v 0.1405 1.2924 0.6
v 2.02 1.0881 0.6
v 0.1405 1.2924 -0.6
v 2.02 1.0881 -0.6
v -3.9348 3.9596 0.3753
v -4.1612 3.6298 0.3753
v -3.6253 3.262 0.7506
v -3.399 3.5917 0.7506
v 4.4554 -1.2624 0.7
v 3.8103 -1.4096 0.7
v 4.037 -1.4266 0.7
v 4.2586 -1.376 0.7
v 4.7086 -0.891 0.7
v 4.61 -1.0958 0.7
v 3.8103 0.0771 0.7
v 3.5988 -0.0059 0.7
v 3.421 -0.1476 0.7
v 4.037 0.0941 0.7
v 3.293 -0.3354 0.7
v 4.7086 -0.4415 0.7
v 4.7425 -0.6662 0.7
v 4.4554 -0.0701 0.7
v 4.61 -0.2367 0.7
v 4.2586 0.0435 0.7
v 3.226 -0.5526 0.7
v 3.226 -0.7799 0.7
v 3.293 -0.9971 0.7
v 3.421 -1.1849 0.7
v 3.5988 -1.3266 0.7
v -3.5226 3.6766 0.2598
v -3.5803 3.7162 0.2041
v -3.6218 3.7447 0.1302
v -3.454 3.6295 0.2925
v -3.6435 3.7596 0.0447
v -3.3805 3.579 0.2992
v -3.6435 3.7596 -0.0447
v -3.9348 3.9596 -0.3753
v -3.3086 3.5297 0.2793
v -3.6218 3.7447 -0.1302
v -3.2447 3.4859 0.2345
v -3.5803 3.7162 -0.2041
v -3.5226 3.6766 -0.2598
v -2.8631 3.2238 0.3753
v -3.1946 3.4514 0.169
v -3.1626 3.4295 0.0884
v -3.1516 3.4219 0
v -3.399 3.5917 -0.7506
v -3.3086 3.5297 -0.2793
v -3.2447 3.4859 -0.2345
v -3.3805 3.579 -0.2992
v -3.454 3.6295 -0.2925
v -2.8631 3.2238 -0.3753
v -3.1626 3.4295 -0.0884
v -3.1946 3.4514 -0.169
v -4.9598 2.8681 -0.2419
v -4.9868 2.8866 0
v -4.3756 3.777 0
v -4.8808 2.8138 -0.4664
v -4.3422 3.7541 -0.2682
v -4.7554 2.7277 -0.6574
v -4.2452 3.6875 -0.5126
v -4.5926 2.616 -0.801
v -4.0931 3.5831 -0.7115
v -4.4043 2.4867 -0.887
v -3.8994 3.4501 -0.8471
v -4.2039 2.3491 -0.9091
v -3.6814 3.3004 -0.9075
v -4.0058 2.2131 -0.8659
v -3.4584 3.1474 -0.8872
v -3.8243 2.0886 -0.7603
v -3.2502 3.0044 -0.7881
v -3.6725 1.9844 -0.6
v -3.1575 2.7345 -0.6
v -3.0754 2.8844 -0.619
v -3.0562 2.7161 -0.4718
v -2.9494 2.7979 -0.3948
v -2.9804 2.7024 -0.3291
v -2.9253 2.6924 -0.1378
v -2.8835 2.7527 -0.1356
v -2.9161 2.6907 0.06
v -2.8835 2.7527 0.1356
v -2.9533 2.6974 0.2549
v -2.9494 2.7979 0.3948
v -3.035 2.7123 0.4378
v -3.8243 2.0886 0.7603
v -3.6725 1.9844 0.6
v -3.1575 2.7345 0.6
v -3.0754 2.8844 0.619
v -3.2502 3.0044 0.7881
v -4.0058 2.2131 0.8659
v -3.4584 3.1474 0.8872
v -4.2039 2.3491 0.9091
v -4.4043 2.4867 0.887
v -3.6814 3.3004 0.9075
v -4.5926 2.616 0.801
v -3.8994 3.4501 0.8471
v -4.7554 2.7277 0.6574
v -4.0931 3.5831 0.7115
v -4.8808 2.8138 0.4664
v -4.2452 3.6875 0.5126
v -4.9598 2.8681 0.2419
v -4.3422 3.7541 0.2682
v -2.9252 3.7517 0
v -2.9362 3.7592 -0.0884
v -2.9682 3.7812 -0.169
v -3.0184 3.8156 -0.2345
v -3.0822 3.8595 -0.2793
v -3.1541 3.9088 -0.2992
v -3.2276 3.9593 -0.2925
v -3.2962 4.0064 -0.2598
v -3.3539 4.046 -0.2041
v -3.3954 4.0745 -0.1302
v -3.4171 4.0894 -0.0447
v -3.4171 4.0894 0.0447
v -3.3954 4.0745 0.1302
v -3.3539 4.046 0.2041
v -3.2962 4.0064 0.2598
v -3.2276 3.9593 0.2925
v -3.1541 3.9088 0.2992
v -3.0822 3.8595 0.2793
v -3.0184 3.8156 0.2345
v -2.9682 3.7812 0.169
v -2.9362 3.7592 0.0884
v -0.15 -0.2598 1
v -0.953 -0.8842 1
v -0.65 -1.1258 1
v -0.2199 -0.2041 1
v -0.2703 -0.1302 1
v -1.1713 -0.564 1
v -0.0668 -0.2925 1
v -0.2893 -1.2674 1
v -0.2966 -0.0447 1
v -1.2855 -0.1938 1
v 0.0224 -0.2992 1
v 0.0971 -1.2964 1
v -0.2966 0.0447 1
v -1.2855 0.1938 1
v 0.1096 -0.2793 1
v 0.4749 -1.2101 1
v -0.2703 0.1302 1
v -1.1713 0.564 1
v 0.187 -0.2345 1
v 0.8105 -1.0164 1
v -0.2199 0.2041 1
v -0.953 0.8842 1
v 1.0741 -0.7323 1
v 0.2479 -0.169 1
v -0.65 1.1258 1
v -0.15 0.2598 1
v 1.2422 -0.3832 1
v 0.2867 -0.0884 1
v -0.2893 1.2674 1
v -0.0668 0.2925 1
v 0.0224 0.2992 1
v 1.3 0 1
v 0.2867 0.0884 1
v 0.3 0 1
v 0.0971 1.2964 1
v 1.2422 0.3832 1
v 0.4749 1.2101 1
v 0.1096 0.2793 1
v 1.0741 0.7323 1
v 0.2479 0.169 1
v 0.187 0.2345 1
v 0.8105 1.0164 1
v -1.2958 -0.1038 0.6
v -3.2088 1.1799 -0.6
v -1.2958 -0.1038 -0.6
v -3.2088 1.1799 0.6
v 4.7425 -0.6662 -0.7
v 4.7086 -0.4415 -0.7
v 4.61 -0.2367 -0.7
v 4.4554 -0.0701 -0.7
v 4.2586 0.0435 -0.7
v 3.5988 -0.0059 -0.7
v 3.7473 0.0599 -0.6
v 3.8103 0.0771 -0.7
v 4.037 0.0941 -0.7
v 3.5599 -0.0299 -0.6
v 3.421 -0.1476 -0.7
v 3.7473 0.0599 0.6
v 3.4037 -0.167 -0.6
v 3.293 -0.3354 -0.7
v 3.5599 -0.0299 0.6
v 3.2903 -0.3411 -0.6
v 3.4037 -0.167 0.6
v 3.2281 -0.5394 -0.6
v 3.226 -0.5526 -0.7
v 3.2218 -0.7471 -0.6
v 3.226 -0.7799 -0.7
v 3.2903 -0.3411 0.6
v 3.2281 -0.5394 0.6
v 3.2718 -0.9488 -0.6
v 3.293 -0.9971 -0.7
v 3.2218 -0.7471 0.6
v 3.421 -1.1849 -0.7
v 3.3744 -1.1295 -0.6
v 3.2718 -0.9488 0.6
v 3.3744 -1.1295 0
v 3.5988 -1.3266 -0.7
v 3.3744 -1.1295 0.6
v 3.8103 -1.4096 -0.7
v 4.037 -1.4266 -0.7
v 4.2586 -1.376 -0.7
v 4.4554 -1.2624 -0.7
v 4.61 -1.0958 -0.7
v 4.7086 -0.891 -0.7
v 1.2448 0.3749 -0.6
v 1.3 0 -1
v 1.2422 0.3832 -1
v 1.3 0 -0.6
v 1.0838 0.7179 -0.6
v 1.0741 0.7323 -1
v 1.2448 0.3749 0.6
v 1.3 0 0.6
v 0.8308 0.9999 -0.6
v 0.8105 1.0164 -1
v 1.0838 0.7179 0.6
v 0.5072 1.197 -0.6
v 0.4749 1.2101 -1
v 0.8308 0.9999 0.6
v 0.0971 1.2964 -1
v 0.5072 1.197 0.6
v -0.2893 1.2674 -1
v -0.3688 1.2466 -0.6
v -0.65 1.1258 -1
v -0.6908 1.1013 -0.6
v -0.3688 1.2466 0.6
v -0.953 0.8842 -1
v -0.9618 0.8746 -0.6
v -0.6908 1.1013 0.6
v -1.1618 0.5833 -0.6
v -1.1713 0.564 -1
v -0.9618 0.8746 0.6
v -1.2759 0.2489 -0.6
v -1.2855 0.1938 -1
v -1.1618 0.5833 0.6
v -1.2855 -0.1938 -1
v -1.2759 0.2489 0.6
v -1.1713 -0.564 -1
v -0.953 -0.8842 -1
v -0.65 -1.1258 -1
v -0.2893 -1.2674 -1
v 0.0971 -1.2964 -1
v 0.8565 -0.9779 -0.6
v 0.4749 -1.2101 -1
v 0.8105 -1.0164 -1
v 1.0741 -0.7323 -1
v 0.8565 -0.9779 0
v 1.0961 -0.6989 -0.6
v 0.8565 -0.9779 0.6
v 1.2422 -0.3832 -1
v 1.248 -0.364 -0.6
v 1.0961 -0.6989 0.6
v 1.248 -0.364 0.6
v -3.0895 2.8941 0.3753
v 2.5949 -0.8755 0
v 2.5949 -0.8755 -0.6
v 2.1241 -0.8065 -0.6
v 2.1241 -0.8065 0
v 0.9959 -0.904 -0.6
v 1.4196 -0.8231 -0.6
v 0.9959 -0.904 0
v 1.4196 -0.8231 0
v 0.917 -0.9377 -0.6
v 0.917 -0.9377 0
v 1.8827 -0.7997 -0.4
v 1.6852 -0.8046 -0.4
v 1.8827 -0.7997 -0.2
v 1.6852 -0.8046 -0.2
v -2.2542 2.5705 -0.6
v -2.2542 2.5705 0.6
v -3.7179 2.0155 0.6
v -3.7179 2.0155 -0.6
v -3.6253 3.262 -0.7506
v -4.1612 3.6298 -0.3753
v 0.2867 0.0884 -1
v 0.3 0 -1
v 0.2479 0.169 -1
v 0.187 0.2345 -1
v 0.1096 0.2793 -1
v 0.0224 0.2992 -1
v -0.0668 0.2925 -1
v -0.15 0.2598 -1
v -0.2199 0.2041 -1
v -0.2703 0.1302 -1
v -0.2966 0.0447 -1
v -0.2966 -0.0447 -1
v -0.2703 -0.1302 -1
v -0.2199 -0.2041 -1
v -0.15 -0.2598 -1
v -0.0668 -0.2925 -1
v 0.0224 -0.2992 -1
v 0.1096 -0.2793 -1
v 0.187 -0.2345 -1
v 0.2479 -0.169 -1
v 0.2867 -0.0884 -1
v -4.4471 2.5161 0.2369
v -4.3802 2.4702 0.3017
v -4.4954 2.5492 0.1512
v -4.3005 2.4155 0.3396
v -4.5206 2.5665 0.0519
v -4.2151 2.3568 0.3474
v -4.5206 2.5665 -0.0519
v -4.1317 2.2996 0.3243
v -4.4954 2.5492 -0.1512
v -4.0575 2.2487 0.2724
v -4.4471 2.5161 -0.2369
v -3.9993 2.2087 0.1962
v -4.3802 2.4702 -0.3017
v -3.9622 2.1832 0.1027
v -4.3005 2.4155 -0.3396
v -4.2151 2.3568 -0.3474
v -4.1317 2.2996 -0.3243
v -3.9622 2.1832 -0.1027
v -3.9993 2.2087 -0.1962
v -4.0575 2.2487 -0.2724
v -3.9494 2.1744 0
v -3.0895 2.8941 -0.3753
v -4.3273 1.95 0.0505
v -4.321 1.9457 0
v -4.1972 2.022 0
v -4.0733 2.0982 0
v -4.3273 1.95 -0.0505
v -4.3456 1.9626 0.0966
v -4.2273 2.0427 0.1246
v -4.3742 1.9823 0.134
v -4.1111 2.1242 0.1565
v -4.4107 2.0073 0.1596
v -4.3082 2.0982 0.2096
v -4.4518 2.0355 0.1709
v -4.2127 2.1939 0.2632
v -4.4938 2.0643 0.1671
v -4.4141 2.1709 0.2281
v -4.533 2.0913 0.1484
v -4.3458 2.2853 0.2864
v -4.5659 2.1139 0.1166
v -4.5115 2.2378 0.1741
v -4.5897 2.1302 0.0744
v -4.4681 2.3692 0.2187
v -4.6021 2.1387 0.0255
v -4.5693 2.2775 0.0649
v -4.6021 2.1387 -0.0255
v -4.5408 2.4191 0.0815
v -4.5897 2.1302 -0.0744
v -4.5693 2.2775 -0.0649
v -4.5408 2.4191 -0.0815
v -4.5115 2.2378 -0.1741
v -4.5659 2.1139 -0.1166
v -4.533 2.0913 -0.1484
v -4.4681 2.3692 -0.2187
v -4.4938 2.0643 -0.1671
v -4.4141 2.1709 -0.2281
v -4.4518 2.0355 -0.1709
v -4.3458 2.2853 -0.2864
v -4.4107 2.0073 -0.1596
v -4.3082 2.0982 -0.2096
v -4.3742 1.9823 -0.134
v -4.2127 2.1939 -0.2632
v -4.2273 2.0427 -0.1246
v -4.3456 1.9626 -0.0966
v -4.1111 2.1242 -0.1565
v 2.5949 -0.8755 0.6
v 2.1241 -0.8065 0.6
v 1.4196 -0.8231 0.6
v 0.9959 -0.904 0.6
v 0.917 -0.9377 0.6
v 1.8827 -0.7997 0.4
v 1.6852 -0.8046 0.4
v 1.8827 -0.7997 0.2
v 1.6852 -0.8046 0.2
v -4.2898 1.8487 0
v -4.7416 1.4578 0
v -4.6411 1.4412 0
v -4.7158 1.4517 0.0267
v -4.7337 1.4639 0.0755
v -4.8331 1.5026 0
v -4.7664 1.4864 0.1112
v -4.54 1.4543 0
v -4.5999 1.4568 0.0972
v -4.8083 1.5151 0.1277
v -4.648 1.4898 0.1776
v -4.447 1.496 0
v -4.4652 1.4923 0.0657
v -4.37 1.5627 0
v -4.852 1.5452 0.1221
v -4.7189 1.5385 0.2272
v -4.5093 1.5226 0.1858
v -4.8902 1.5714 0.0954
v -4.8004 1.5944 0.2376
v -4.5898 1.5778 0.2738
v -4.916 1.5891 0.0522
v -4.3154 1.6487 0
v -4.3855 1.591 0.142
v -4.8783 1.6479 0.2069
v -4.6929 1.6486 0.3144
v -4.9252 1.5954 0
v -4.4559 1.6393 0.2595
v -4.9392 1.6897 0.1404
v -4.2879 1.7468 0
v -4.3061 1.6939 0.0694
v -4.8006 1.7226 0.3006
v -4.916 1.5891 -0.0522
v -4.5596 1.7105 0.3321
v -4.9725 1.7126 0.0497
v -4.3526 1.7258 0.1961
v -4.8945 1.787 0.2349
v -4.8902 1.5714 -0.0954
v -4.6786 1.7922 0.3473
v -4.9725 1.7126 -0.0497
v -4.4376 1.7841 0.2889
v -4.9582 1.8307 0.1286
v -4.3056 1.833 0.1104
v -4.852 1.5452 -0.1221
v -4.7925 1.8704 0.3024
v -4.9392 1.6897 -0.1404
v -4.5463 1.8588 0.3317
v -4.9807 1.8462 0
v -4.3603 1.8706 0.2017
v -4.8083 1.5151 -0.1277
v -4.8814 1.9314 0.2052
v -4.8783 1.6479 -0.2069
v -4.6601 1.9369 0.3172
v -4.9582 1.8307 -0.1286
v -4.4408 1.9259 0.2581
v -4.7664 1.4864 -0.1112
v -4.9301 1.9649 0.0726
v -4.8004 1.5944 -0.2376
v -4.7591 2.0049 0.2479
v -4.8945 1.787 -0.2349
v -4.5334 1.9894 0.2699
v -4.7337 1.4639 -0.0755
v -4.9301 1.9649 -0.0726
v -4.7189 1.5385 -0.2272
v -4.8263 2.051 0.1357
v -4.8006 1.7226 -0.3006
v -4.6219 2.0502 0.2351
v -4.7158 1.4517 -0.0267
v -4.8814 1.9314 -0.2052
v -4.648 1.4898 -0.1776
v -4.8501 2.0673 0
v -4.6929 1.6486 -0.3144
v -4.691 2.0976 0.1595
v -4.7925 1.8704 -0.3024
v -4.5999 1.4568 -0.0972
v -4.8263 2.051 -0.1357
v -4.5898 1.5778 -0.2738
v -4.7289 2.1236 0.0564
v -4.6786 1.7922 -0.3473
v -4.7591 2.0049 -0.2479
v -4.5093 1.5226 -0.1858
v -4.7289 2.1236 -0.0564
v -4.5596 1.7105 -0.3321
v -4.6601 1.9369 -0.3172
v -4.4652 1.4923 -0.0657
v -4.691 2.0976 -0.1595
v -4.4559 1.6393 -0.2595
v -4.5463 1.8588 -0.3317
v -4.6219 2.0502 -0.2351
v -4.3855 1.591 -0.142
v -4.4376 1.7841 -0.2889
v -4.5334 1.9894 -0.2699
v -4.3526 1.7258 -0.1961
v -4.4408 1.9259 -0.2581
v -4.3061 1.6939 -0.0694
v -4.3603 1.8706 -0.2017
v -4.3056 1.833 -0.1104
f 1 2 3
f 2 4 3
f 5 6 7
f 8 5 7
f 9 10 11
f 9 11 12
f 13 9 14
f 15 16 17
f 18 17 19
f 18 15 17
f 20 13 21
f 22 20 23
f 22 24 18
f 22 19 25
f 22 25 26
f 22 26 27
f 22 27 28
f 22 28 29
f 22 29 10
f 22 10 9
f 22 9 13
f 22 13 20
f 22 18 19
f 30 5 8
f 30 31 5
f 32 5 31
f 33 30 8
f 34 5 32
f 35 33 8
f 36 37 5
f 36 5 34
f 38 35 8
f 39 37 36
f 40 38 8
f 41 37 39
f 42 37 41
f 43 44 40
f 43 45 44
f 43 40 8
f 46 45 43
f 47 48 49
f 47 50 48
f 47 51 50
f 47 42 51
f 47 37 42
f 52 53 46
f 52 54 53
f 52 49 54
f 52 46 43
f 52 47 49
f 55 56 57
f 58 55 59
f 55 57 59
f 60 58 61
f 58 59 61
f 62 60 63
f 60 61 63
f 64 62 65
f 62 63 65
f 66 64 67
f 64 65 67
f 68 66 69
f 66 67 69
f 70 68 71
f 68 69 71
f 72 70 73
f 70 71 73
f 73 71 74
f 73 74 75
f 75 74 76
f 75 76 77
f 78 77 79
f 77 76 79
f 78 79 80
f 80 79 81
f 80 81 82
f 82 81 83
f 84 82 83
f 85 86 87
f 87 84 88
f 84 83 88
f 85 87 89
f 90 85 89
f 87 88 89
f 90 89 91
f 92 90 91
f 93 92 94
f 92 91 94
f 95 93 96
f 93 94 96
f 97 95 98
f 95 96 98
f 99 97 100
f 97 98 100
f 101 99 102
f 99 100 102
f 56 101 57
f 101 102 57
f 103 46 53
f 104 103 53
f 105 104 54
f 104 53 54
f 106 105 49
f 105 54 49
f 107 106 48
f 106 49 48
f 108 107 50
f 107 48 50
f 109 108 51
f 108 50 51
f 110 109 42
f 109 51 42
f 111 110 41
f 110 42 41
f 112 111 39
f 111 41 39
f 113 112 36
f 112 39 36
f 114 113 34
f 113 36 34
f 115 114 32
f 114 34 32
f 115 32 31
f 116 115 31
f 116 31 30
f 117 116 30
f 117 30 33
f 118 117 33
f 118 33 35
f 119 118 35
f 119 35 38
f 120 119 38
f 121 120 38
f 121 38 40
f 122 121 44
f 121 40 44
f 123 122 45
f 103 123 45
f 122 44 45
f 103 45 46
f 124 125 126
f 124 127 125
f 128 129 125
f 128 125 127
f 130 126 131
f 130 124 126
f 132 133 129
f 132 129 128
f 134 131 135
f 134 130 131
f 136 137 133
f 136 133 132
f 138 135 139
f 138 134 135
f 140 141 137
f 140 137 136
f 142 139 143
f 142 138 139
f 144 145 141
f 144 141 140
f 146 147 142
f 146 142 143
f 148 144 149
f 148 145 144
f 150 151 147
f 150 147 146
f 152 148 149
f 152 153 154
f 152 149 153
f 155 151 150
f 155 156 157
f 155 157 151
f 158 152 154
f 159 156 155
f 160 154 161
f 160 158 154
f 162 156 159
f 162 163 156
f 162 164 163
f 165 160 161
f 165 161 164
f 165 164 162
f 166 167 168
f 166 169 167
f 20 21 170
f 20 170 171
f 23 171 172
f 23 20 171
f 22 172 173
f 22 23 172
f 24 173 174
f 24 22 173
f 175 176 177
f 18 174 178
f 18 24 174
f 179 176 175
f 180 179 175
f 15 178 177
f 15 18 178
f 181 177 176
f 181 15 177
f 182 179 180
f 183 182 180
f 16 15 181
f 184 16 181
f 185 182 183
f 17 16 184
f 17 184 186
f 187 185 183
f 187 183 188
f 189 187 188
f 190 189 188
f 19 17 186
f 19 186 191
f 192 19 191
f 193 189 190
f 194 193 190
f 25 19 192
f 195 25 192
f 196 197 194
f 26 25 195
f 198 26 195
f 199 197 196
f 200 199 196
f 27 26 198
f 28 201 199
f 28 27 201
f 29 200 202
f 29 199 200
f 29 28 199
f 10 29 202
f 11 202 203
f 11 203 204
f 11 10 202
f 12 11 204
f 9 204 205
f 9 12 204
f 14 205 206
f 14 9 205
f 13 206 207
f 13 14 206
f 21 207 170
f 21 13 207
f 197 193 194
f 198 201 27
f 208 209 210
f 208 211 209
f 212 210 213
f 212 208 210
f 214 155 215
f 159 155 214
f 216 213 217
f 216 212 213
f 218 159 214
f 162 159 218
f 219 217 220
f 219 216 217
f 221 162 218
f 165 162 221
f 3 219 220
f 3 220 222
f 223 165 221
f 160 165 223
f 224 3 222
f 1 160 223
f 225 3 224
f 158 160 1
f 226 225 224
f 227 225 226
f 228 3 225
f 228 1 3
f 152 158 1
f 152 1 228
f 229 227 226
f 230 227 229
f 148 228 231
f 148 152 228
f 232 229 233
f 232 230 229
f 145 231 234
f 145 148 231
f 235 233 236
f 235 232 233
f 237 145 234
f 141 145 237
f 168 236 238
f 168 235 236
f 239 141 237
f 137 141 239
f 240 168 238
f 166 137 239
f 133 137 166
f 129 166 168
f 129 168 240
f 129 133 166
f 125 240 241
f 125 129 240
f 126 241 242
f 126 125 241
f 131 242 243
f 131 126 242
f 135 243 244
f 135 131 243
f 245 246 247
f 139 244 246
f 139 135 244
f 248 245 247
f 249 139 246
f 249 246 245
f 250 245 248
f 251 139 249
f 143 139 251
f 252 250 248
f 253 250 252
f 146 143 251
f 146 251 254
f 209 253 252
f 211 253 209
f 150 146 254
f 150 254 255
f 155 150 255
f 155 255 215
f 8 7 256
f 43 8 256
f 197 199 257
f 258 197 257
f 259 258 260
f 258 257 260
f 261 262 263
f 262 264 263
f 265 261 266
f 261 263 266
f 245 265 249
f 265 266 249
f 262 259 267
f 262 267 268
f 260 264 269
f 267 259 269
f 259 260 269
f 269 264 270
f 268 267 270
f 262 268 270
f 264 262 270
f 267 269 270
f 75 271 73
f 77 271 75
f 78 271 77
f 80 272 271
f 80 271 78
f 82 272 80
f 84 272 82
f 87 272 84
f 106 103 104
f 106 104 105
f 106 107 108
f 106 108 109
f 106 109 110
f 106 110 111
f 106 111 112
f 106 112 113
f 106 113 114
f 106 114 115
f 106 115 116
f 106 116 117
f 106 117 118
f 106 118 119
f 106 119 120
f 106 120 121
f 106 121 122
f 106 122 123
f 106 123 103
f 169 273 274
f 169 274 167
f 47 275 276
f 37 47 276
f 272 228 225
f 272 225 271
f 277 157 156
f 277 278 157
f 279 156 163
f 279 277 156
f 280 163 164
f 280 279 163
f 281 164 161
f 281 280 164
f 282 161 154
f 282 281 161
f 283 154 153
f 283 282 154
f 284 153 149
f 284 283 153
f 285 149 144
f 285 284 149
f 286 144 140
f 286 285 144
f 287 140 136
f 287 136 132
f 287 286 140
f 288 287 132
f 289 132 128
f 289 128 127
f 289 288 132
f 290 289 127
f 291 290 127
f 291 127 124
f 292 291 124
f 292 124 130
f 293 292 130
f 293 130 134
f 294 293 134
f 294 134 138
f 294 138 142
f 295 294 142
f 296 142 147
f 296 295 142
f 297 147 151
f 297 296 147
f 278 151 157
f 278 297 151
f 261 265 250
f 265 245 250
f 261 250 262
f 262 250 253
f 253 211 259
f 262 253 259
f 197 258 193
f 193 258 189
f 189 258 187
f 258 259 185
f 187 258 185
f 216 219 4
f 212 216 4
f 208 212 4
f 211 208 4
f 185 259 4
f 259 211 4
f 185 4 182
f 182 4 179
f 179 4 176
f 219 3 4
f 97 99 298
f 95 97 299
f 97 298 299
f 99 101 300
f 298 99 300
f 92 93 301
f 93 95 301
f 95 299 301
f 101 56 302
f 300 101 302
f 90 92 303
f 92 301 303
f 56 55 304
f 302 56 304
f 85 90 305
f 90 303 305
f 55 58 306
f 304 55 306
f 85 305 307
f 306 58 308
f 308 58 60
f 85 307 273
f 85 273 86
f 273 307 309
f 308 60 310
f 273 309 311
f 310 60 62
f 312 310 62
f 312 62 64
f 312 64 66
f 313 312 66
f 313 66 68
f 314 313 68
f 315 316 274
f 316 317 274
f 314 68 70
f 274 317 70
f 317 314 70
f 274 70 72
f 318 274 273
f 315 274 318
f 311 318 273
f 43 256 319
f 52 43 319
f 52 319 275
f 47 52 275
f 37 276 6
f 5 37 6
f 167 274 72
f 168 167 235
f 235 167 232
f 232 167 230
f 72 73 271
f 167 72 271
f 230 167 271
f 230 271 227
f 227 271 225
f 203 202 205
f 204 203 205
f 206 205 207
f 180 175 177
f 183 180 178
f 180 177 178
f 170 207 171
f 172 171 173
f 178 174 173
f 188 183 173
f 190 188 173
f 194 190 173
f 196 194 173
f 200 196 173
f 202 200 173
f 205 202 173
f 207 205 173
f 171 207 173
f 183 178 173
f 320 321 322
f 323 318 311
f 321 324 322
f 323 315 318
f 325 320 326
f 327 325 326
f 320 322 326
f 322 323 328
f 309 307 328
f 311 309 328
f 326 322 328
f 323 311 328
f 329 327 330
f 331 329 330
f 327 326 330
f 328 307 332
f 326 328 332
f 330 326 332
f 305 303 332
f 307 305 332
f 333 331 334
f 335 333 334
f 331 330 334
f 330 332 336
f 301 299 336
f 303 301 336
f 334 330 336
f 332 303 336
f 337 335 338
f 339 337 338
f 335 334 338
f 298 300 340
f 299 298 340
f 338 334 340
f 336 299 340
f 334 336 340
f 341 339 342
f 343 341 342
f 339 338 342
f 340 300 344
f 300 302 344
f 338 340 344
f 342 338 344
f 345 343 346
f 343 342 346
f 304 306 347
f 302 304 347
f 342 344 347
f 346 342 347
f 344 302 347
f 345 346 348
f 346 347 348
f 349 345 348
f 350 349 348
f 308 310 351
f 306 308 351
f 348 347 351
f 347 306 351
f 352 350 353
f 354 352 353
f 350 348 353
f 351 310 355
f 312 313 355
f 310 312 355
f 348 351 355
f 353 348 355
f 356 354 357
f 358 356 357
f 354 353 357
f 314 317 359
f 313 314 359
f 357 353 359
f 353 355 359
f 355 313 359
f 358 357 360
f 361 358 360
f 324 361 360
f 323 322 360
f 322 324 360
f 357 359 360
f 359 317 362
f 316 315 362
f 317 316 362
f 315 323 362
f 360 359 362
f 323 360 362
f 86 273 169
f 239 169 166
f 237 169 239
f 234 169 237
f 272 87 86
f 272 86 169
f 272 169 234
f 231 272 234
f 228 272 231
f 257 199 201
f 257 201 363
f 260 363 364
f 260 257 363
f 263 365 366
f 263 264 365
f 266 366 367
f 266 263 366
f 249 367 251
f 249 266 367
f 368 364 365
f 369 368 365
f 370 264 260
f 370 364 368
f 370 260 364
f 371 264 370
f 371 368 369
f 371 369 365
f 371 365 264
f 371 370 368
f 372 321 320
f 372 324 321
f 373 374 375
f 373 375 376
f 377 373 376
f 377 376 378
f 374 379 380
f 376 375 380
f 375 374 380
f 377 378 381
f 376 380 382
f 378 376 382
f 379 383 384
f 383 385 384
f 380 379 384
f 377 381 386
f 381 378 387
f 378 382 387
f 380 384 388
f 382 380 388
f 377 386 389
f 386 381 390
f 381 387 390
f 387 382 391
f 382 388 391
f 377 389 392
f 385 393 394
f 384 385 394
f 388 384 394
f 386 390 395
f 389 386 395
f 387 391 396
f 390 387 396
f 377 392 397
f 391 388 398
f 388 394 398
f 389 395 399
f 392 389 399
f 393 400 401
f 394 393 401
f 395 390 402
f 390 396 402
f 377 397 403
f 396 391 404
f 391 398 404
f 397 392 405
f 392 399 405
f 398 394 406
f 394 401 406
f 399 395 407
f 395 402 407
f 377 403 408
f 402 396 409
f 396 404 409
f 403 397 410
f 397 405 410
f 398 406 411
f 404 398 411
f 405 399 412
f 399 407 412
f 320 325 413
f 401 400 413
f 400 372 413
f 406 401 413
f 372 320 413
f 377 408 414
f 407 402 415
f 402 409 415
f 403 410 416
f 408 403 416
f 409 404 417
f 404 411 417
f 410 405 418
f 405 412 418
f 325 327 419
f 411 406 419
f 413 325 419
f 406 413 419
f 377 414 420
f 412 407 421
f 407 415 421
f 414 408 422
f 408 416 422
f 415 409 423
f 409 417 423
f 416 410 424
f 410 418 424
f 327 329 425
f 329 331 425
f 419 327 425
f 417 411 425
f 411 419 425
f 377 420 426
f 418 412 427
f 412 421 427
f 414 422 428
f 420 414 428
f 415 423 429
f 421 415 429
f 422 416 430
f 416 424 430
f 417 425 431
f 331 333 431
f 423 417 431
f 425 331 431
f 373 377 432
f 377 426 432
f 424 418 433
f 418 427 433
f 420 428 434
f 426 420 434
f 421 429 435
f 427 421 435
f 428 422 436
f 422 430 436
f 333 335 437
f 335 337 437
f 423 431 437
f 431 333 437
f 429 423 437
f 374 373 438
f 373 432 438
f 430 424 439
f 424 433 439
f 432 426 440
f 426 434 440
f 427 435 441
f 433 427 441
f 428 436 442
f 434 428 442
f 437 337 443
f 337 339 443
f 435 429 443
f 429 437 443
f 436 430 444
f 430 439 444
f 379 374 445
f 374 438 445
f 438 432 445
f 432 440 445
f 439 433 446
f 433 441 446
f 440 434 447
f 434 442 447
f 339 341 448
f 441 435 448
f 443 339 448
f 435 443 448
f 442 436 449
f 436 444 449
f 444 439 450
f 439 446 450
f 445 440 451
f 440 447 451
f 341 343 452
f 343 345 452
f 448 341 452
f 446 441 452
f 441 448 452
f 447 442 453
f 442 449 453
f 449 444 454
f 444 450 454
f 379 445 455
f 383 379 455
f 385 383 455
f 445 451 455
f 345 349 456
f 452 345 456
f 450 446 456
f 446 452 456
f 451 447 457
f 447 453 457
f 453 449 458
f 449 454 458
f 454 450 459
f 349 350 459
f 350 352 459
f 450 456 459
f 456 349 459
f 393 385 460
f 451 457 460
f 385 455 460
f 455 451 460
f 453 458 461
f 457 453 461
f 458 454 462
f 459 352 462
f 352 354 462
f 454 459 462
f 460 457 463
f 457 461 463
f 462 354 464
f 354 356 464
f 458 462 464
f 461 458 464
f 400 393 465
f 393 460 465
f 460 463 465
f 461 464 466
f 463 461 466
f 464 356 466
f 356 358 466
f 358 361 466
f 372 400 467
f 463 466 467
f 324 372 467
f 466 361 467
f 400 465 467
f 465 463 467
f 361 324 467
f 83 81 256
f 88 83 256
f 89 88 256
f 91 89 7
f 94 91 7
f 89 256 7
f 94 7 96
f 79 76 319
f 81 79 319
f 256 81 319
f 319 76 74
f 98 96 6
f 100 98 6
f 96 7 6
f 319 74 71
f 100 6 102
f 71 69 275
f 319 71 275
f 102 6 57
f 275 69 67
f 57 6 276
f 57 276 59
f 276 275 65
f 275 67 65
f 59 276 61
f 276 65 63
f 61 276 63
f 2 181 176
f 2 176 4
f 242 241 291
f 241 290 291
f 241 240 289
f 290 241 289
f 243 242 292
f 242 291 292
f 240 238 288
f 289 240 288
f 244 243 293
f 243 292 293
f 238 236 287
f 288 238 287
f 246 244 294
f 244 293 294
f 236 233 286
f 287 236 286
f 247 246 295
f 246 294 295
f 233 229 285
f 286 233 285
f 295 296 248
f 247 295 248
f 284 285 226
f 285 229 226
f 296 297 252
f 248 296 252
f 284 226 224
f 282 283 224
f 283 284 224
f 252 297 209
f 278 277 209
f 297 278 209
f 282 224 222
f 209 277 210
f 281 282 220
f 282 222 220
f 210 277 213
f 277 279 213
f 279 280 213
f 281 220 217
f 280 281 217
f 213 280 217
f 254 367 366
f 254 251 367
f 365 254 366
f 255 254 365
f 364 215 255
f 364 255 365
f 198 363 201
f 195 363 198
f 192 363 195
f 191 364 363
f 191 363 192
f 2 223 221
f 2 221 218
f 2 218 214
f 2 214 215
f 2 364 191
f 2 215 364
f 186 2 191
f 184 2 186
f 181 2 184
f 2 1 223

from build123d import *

# Parameters (mm, degrees)
SKETCH1_R           = 0.3
BOSS_EXTRUDE1_DEPTH = 1
BOSS_EXTRUDE2_DEPTH = 0.7
BOSS_EXTRUDE3_DEPTH = 0.6
BOSS_EXTRUDE4_DEPTH = 0.6
BOSS_EXTRUDE5_DEPTH = 0.4
SKETCH5_R           = 0.3
BOSS_EXTRUDE6_DEPTH = 0.4


with BuildPart() as part:
    # Sketch1 → Boss-Extrude1 (new, symmetric)
    with BuildSketch(Plane.XY):
        with BuildLine():
            ThreePointArc((1.3, 0), (0.967631362, 0.868152951), (0.140477621, 1.292387727))
            ThreePointArc((0.140477621, 1.292387727), (-0.11642585, 1.294776051), (-0.368782161, 1.24659525))
            ThreePointArc((-0.368782161, 1.24659525), (-1.071749439, 0.735767042), (-1.295848634, -0.103809043))
            ThreePointArc((-1.295848634, -0.103809043), (-0.48915419, -1.204461779), (0.856533864, -0.977931357))
            ThreePointArc((0.856533864, -0.977931357), (1.183953974, -0.536891971), (1.3, 0))
        make_face()
        Circle(SKETCH1_R, mode=Mode.SUBTRACT)
    extrude(amount=BOSS_EXTRUDE1_DEPTH, both=True)



with BuildPart() as body_2:
    # Sketch1<3> → Boss-Extrude2 (new, symmetric)
    with BuildSketch(Plane.XY):
        with BuildLine():
            ThreePointArc((4.7425, -0.66624549), (4.429408871, -0.050260168), (3.747253005, 0.059864065))
            ThreePointArc((3.747253005, 0.059864065), (3.252423356, -0.438126053), (3.374350994, -1.12949006))
            ThreePointArc((3.374350994, -1.12949006), (4.224539243, -1.388469007), (4.7425, -0.66624549))
        make_face()
    extrude(amount=BOSS_EXTRUDE2_DEPTH, both=True)


with BuildPart() as part_1:
    add(part.part)

    add(body_2.part)  # Boss-Extrude3 merges body 2
    # Sketch1<4> → Boss-Extrude3 (add, symmetric)
    with BuildSketch(Plane.XY):
        with BuildLine():
            ThreePointArc((3.374350994, -1.12949006), (3.252423356, -0.438126053), (3.747253005, 0.059864065))
            Line((3.747253005, 0.059864065), (2.019976925, 1.088093316))
            Line((2.019976925, 1.088093316), (0.140477621, 1.292387727))
            ThreePointArc((0.140477621, 1.292387727), (0.967631362, 0.868152951), (1.3, 0))
            ThreePointArc((1.3, 0), (1.183953974, -0.536891971), (0.856533864, -0.977931357))
            add(Edge.make_bspline(
                [(3.374350994, -1.12949006), (2.778476345, -0.90659845), (2.406966993, -0.786012749), (1.50197992, -0.807474496), (0.996483155, -0.855354956), (0.856533864, -0.977931357)],
                knots=[0, 0, 0, 0, 0.647248286, 0.718239717, 1, 1, 1, 1], degree=3))
        make_face()
    extrude(amount=BOSS_EXTRUDE3_DEPTH, both=True)

    # Sketch1<5> → Boss-Extrude4 (add, symmetric)
    with BuildSketch(Plane.XY):
        with BuildLine():
            ThreePointArc((-1.295848634, -0.103809043), (-1.071749439, 0.735767042), (-0.368782161, 1.24659525))
            Line((-0.368782161, 1.24659525), (-2.254212966, 2.57050074))
            Line((-2.254212966, 2.57050074), (-3.469420101, 2.791170079))
            Line((-3.469420101, 2.791170079), (-3.851452989, 2.234684794))
            Line((-3.851452989, 2.234684794), (-3.20884425, 1.179944376))
            Line((-3.20884425, 1.179944376), (-1.295848634, -0.103809043))
        make_face()
    extrude(amount=BOSS_EXTRUDE4_DEPTH, both=True)



with BuildPart() as body_2_2:
    # Sketch2 → Revolve1 (revolve)
    with BuildSketch(Plane.XY):
        with BuildLine():
            Line((-3.851452989, 2.234684794), (-3.357165564, 2.954684794))
            Line((-3.357165564, 2.954684794), (-3.682812508, 3.17824478))
            Line((-3.682812508, 3.17824478), (-4.833144721, 1.502622153))
            ThreePointArc((-4.833144721, 1.502622153), (-4.406042562, 1.526493017), (-4.321028806, 1.945728909))
            Line((-4.321028806, 1.945728909), (-3.851452989, 2.234684794))
        make_face()
    revolve(axis=Axis((-3.682812508, 3.17824478, 0), (-0.5659746478395022, -0.8244226452511791, 0)))


with BuildPart() as part_2:
    add(part_1.part)

    add(body_2_2.part)  # Revolve2 merges body 2 2
    # Sketch3 → Revolve2 (revolve)
    with BuildSketch(Plane.XY):
        Polygon((-3.62534147, 3.261959529), (-4.236594089, 2.371583072), (-4.986818697, 2.886620001), (-4.375566077, 3.776996458), align=None)
    revolve(axis=Axis((-3.62534147, 3.261959529, 0), (-0.5659746478394974, -0.8244226452511825, 0)))

    # Sketch4 → Boss-Extrude5 (add)
    with BuildSketch(Plane(origin=(0.36074202, 0.525472106, 0), x_dir=(0.8244226452511824, -0.5659746478394974, 0), z_dir=(0.5659746478394974, 0.8244226452511824, 0))):
        Polygon((-4.835, -0.75055535), (-4.185, -0.375277675), (-4.185, 0.375277675), (-4.835, 0.75055535), (-5.485, 0.375277675), (-5.485, -0.375277675), align=None)
    extrude(amount=BOSS_EXTRUDE5_DEPTH)

    # Sketch5 → Boss-Extrude6 (add)
    with BuildSketch(Plane(origin=(0.587131879, 0.855241165, 0), x_dir=(0.8244226452511826, -0.5659746478394971, 0), z_dir=(0.5659746478394971, 0.8244226452511827, 0))):
        with Locations((-4.835, 0)):
            Circle(SKETCH5_R)
    extrude(amount=BOSS_EXTRUDE6_DEPTH)


solid = part_2.part
